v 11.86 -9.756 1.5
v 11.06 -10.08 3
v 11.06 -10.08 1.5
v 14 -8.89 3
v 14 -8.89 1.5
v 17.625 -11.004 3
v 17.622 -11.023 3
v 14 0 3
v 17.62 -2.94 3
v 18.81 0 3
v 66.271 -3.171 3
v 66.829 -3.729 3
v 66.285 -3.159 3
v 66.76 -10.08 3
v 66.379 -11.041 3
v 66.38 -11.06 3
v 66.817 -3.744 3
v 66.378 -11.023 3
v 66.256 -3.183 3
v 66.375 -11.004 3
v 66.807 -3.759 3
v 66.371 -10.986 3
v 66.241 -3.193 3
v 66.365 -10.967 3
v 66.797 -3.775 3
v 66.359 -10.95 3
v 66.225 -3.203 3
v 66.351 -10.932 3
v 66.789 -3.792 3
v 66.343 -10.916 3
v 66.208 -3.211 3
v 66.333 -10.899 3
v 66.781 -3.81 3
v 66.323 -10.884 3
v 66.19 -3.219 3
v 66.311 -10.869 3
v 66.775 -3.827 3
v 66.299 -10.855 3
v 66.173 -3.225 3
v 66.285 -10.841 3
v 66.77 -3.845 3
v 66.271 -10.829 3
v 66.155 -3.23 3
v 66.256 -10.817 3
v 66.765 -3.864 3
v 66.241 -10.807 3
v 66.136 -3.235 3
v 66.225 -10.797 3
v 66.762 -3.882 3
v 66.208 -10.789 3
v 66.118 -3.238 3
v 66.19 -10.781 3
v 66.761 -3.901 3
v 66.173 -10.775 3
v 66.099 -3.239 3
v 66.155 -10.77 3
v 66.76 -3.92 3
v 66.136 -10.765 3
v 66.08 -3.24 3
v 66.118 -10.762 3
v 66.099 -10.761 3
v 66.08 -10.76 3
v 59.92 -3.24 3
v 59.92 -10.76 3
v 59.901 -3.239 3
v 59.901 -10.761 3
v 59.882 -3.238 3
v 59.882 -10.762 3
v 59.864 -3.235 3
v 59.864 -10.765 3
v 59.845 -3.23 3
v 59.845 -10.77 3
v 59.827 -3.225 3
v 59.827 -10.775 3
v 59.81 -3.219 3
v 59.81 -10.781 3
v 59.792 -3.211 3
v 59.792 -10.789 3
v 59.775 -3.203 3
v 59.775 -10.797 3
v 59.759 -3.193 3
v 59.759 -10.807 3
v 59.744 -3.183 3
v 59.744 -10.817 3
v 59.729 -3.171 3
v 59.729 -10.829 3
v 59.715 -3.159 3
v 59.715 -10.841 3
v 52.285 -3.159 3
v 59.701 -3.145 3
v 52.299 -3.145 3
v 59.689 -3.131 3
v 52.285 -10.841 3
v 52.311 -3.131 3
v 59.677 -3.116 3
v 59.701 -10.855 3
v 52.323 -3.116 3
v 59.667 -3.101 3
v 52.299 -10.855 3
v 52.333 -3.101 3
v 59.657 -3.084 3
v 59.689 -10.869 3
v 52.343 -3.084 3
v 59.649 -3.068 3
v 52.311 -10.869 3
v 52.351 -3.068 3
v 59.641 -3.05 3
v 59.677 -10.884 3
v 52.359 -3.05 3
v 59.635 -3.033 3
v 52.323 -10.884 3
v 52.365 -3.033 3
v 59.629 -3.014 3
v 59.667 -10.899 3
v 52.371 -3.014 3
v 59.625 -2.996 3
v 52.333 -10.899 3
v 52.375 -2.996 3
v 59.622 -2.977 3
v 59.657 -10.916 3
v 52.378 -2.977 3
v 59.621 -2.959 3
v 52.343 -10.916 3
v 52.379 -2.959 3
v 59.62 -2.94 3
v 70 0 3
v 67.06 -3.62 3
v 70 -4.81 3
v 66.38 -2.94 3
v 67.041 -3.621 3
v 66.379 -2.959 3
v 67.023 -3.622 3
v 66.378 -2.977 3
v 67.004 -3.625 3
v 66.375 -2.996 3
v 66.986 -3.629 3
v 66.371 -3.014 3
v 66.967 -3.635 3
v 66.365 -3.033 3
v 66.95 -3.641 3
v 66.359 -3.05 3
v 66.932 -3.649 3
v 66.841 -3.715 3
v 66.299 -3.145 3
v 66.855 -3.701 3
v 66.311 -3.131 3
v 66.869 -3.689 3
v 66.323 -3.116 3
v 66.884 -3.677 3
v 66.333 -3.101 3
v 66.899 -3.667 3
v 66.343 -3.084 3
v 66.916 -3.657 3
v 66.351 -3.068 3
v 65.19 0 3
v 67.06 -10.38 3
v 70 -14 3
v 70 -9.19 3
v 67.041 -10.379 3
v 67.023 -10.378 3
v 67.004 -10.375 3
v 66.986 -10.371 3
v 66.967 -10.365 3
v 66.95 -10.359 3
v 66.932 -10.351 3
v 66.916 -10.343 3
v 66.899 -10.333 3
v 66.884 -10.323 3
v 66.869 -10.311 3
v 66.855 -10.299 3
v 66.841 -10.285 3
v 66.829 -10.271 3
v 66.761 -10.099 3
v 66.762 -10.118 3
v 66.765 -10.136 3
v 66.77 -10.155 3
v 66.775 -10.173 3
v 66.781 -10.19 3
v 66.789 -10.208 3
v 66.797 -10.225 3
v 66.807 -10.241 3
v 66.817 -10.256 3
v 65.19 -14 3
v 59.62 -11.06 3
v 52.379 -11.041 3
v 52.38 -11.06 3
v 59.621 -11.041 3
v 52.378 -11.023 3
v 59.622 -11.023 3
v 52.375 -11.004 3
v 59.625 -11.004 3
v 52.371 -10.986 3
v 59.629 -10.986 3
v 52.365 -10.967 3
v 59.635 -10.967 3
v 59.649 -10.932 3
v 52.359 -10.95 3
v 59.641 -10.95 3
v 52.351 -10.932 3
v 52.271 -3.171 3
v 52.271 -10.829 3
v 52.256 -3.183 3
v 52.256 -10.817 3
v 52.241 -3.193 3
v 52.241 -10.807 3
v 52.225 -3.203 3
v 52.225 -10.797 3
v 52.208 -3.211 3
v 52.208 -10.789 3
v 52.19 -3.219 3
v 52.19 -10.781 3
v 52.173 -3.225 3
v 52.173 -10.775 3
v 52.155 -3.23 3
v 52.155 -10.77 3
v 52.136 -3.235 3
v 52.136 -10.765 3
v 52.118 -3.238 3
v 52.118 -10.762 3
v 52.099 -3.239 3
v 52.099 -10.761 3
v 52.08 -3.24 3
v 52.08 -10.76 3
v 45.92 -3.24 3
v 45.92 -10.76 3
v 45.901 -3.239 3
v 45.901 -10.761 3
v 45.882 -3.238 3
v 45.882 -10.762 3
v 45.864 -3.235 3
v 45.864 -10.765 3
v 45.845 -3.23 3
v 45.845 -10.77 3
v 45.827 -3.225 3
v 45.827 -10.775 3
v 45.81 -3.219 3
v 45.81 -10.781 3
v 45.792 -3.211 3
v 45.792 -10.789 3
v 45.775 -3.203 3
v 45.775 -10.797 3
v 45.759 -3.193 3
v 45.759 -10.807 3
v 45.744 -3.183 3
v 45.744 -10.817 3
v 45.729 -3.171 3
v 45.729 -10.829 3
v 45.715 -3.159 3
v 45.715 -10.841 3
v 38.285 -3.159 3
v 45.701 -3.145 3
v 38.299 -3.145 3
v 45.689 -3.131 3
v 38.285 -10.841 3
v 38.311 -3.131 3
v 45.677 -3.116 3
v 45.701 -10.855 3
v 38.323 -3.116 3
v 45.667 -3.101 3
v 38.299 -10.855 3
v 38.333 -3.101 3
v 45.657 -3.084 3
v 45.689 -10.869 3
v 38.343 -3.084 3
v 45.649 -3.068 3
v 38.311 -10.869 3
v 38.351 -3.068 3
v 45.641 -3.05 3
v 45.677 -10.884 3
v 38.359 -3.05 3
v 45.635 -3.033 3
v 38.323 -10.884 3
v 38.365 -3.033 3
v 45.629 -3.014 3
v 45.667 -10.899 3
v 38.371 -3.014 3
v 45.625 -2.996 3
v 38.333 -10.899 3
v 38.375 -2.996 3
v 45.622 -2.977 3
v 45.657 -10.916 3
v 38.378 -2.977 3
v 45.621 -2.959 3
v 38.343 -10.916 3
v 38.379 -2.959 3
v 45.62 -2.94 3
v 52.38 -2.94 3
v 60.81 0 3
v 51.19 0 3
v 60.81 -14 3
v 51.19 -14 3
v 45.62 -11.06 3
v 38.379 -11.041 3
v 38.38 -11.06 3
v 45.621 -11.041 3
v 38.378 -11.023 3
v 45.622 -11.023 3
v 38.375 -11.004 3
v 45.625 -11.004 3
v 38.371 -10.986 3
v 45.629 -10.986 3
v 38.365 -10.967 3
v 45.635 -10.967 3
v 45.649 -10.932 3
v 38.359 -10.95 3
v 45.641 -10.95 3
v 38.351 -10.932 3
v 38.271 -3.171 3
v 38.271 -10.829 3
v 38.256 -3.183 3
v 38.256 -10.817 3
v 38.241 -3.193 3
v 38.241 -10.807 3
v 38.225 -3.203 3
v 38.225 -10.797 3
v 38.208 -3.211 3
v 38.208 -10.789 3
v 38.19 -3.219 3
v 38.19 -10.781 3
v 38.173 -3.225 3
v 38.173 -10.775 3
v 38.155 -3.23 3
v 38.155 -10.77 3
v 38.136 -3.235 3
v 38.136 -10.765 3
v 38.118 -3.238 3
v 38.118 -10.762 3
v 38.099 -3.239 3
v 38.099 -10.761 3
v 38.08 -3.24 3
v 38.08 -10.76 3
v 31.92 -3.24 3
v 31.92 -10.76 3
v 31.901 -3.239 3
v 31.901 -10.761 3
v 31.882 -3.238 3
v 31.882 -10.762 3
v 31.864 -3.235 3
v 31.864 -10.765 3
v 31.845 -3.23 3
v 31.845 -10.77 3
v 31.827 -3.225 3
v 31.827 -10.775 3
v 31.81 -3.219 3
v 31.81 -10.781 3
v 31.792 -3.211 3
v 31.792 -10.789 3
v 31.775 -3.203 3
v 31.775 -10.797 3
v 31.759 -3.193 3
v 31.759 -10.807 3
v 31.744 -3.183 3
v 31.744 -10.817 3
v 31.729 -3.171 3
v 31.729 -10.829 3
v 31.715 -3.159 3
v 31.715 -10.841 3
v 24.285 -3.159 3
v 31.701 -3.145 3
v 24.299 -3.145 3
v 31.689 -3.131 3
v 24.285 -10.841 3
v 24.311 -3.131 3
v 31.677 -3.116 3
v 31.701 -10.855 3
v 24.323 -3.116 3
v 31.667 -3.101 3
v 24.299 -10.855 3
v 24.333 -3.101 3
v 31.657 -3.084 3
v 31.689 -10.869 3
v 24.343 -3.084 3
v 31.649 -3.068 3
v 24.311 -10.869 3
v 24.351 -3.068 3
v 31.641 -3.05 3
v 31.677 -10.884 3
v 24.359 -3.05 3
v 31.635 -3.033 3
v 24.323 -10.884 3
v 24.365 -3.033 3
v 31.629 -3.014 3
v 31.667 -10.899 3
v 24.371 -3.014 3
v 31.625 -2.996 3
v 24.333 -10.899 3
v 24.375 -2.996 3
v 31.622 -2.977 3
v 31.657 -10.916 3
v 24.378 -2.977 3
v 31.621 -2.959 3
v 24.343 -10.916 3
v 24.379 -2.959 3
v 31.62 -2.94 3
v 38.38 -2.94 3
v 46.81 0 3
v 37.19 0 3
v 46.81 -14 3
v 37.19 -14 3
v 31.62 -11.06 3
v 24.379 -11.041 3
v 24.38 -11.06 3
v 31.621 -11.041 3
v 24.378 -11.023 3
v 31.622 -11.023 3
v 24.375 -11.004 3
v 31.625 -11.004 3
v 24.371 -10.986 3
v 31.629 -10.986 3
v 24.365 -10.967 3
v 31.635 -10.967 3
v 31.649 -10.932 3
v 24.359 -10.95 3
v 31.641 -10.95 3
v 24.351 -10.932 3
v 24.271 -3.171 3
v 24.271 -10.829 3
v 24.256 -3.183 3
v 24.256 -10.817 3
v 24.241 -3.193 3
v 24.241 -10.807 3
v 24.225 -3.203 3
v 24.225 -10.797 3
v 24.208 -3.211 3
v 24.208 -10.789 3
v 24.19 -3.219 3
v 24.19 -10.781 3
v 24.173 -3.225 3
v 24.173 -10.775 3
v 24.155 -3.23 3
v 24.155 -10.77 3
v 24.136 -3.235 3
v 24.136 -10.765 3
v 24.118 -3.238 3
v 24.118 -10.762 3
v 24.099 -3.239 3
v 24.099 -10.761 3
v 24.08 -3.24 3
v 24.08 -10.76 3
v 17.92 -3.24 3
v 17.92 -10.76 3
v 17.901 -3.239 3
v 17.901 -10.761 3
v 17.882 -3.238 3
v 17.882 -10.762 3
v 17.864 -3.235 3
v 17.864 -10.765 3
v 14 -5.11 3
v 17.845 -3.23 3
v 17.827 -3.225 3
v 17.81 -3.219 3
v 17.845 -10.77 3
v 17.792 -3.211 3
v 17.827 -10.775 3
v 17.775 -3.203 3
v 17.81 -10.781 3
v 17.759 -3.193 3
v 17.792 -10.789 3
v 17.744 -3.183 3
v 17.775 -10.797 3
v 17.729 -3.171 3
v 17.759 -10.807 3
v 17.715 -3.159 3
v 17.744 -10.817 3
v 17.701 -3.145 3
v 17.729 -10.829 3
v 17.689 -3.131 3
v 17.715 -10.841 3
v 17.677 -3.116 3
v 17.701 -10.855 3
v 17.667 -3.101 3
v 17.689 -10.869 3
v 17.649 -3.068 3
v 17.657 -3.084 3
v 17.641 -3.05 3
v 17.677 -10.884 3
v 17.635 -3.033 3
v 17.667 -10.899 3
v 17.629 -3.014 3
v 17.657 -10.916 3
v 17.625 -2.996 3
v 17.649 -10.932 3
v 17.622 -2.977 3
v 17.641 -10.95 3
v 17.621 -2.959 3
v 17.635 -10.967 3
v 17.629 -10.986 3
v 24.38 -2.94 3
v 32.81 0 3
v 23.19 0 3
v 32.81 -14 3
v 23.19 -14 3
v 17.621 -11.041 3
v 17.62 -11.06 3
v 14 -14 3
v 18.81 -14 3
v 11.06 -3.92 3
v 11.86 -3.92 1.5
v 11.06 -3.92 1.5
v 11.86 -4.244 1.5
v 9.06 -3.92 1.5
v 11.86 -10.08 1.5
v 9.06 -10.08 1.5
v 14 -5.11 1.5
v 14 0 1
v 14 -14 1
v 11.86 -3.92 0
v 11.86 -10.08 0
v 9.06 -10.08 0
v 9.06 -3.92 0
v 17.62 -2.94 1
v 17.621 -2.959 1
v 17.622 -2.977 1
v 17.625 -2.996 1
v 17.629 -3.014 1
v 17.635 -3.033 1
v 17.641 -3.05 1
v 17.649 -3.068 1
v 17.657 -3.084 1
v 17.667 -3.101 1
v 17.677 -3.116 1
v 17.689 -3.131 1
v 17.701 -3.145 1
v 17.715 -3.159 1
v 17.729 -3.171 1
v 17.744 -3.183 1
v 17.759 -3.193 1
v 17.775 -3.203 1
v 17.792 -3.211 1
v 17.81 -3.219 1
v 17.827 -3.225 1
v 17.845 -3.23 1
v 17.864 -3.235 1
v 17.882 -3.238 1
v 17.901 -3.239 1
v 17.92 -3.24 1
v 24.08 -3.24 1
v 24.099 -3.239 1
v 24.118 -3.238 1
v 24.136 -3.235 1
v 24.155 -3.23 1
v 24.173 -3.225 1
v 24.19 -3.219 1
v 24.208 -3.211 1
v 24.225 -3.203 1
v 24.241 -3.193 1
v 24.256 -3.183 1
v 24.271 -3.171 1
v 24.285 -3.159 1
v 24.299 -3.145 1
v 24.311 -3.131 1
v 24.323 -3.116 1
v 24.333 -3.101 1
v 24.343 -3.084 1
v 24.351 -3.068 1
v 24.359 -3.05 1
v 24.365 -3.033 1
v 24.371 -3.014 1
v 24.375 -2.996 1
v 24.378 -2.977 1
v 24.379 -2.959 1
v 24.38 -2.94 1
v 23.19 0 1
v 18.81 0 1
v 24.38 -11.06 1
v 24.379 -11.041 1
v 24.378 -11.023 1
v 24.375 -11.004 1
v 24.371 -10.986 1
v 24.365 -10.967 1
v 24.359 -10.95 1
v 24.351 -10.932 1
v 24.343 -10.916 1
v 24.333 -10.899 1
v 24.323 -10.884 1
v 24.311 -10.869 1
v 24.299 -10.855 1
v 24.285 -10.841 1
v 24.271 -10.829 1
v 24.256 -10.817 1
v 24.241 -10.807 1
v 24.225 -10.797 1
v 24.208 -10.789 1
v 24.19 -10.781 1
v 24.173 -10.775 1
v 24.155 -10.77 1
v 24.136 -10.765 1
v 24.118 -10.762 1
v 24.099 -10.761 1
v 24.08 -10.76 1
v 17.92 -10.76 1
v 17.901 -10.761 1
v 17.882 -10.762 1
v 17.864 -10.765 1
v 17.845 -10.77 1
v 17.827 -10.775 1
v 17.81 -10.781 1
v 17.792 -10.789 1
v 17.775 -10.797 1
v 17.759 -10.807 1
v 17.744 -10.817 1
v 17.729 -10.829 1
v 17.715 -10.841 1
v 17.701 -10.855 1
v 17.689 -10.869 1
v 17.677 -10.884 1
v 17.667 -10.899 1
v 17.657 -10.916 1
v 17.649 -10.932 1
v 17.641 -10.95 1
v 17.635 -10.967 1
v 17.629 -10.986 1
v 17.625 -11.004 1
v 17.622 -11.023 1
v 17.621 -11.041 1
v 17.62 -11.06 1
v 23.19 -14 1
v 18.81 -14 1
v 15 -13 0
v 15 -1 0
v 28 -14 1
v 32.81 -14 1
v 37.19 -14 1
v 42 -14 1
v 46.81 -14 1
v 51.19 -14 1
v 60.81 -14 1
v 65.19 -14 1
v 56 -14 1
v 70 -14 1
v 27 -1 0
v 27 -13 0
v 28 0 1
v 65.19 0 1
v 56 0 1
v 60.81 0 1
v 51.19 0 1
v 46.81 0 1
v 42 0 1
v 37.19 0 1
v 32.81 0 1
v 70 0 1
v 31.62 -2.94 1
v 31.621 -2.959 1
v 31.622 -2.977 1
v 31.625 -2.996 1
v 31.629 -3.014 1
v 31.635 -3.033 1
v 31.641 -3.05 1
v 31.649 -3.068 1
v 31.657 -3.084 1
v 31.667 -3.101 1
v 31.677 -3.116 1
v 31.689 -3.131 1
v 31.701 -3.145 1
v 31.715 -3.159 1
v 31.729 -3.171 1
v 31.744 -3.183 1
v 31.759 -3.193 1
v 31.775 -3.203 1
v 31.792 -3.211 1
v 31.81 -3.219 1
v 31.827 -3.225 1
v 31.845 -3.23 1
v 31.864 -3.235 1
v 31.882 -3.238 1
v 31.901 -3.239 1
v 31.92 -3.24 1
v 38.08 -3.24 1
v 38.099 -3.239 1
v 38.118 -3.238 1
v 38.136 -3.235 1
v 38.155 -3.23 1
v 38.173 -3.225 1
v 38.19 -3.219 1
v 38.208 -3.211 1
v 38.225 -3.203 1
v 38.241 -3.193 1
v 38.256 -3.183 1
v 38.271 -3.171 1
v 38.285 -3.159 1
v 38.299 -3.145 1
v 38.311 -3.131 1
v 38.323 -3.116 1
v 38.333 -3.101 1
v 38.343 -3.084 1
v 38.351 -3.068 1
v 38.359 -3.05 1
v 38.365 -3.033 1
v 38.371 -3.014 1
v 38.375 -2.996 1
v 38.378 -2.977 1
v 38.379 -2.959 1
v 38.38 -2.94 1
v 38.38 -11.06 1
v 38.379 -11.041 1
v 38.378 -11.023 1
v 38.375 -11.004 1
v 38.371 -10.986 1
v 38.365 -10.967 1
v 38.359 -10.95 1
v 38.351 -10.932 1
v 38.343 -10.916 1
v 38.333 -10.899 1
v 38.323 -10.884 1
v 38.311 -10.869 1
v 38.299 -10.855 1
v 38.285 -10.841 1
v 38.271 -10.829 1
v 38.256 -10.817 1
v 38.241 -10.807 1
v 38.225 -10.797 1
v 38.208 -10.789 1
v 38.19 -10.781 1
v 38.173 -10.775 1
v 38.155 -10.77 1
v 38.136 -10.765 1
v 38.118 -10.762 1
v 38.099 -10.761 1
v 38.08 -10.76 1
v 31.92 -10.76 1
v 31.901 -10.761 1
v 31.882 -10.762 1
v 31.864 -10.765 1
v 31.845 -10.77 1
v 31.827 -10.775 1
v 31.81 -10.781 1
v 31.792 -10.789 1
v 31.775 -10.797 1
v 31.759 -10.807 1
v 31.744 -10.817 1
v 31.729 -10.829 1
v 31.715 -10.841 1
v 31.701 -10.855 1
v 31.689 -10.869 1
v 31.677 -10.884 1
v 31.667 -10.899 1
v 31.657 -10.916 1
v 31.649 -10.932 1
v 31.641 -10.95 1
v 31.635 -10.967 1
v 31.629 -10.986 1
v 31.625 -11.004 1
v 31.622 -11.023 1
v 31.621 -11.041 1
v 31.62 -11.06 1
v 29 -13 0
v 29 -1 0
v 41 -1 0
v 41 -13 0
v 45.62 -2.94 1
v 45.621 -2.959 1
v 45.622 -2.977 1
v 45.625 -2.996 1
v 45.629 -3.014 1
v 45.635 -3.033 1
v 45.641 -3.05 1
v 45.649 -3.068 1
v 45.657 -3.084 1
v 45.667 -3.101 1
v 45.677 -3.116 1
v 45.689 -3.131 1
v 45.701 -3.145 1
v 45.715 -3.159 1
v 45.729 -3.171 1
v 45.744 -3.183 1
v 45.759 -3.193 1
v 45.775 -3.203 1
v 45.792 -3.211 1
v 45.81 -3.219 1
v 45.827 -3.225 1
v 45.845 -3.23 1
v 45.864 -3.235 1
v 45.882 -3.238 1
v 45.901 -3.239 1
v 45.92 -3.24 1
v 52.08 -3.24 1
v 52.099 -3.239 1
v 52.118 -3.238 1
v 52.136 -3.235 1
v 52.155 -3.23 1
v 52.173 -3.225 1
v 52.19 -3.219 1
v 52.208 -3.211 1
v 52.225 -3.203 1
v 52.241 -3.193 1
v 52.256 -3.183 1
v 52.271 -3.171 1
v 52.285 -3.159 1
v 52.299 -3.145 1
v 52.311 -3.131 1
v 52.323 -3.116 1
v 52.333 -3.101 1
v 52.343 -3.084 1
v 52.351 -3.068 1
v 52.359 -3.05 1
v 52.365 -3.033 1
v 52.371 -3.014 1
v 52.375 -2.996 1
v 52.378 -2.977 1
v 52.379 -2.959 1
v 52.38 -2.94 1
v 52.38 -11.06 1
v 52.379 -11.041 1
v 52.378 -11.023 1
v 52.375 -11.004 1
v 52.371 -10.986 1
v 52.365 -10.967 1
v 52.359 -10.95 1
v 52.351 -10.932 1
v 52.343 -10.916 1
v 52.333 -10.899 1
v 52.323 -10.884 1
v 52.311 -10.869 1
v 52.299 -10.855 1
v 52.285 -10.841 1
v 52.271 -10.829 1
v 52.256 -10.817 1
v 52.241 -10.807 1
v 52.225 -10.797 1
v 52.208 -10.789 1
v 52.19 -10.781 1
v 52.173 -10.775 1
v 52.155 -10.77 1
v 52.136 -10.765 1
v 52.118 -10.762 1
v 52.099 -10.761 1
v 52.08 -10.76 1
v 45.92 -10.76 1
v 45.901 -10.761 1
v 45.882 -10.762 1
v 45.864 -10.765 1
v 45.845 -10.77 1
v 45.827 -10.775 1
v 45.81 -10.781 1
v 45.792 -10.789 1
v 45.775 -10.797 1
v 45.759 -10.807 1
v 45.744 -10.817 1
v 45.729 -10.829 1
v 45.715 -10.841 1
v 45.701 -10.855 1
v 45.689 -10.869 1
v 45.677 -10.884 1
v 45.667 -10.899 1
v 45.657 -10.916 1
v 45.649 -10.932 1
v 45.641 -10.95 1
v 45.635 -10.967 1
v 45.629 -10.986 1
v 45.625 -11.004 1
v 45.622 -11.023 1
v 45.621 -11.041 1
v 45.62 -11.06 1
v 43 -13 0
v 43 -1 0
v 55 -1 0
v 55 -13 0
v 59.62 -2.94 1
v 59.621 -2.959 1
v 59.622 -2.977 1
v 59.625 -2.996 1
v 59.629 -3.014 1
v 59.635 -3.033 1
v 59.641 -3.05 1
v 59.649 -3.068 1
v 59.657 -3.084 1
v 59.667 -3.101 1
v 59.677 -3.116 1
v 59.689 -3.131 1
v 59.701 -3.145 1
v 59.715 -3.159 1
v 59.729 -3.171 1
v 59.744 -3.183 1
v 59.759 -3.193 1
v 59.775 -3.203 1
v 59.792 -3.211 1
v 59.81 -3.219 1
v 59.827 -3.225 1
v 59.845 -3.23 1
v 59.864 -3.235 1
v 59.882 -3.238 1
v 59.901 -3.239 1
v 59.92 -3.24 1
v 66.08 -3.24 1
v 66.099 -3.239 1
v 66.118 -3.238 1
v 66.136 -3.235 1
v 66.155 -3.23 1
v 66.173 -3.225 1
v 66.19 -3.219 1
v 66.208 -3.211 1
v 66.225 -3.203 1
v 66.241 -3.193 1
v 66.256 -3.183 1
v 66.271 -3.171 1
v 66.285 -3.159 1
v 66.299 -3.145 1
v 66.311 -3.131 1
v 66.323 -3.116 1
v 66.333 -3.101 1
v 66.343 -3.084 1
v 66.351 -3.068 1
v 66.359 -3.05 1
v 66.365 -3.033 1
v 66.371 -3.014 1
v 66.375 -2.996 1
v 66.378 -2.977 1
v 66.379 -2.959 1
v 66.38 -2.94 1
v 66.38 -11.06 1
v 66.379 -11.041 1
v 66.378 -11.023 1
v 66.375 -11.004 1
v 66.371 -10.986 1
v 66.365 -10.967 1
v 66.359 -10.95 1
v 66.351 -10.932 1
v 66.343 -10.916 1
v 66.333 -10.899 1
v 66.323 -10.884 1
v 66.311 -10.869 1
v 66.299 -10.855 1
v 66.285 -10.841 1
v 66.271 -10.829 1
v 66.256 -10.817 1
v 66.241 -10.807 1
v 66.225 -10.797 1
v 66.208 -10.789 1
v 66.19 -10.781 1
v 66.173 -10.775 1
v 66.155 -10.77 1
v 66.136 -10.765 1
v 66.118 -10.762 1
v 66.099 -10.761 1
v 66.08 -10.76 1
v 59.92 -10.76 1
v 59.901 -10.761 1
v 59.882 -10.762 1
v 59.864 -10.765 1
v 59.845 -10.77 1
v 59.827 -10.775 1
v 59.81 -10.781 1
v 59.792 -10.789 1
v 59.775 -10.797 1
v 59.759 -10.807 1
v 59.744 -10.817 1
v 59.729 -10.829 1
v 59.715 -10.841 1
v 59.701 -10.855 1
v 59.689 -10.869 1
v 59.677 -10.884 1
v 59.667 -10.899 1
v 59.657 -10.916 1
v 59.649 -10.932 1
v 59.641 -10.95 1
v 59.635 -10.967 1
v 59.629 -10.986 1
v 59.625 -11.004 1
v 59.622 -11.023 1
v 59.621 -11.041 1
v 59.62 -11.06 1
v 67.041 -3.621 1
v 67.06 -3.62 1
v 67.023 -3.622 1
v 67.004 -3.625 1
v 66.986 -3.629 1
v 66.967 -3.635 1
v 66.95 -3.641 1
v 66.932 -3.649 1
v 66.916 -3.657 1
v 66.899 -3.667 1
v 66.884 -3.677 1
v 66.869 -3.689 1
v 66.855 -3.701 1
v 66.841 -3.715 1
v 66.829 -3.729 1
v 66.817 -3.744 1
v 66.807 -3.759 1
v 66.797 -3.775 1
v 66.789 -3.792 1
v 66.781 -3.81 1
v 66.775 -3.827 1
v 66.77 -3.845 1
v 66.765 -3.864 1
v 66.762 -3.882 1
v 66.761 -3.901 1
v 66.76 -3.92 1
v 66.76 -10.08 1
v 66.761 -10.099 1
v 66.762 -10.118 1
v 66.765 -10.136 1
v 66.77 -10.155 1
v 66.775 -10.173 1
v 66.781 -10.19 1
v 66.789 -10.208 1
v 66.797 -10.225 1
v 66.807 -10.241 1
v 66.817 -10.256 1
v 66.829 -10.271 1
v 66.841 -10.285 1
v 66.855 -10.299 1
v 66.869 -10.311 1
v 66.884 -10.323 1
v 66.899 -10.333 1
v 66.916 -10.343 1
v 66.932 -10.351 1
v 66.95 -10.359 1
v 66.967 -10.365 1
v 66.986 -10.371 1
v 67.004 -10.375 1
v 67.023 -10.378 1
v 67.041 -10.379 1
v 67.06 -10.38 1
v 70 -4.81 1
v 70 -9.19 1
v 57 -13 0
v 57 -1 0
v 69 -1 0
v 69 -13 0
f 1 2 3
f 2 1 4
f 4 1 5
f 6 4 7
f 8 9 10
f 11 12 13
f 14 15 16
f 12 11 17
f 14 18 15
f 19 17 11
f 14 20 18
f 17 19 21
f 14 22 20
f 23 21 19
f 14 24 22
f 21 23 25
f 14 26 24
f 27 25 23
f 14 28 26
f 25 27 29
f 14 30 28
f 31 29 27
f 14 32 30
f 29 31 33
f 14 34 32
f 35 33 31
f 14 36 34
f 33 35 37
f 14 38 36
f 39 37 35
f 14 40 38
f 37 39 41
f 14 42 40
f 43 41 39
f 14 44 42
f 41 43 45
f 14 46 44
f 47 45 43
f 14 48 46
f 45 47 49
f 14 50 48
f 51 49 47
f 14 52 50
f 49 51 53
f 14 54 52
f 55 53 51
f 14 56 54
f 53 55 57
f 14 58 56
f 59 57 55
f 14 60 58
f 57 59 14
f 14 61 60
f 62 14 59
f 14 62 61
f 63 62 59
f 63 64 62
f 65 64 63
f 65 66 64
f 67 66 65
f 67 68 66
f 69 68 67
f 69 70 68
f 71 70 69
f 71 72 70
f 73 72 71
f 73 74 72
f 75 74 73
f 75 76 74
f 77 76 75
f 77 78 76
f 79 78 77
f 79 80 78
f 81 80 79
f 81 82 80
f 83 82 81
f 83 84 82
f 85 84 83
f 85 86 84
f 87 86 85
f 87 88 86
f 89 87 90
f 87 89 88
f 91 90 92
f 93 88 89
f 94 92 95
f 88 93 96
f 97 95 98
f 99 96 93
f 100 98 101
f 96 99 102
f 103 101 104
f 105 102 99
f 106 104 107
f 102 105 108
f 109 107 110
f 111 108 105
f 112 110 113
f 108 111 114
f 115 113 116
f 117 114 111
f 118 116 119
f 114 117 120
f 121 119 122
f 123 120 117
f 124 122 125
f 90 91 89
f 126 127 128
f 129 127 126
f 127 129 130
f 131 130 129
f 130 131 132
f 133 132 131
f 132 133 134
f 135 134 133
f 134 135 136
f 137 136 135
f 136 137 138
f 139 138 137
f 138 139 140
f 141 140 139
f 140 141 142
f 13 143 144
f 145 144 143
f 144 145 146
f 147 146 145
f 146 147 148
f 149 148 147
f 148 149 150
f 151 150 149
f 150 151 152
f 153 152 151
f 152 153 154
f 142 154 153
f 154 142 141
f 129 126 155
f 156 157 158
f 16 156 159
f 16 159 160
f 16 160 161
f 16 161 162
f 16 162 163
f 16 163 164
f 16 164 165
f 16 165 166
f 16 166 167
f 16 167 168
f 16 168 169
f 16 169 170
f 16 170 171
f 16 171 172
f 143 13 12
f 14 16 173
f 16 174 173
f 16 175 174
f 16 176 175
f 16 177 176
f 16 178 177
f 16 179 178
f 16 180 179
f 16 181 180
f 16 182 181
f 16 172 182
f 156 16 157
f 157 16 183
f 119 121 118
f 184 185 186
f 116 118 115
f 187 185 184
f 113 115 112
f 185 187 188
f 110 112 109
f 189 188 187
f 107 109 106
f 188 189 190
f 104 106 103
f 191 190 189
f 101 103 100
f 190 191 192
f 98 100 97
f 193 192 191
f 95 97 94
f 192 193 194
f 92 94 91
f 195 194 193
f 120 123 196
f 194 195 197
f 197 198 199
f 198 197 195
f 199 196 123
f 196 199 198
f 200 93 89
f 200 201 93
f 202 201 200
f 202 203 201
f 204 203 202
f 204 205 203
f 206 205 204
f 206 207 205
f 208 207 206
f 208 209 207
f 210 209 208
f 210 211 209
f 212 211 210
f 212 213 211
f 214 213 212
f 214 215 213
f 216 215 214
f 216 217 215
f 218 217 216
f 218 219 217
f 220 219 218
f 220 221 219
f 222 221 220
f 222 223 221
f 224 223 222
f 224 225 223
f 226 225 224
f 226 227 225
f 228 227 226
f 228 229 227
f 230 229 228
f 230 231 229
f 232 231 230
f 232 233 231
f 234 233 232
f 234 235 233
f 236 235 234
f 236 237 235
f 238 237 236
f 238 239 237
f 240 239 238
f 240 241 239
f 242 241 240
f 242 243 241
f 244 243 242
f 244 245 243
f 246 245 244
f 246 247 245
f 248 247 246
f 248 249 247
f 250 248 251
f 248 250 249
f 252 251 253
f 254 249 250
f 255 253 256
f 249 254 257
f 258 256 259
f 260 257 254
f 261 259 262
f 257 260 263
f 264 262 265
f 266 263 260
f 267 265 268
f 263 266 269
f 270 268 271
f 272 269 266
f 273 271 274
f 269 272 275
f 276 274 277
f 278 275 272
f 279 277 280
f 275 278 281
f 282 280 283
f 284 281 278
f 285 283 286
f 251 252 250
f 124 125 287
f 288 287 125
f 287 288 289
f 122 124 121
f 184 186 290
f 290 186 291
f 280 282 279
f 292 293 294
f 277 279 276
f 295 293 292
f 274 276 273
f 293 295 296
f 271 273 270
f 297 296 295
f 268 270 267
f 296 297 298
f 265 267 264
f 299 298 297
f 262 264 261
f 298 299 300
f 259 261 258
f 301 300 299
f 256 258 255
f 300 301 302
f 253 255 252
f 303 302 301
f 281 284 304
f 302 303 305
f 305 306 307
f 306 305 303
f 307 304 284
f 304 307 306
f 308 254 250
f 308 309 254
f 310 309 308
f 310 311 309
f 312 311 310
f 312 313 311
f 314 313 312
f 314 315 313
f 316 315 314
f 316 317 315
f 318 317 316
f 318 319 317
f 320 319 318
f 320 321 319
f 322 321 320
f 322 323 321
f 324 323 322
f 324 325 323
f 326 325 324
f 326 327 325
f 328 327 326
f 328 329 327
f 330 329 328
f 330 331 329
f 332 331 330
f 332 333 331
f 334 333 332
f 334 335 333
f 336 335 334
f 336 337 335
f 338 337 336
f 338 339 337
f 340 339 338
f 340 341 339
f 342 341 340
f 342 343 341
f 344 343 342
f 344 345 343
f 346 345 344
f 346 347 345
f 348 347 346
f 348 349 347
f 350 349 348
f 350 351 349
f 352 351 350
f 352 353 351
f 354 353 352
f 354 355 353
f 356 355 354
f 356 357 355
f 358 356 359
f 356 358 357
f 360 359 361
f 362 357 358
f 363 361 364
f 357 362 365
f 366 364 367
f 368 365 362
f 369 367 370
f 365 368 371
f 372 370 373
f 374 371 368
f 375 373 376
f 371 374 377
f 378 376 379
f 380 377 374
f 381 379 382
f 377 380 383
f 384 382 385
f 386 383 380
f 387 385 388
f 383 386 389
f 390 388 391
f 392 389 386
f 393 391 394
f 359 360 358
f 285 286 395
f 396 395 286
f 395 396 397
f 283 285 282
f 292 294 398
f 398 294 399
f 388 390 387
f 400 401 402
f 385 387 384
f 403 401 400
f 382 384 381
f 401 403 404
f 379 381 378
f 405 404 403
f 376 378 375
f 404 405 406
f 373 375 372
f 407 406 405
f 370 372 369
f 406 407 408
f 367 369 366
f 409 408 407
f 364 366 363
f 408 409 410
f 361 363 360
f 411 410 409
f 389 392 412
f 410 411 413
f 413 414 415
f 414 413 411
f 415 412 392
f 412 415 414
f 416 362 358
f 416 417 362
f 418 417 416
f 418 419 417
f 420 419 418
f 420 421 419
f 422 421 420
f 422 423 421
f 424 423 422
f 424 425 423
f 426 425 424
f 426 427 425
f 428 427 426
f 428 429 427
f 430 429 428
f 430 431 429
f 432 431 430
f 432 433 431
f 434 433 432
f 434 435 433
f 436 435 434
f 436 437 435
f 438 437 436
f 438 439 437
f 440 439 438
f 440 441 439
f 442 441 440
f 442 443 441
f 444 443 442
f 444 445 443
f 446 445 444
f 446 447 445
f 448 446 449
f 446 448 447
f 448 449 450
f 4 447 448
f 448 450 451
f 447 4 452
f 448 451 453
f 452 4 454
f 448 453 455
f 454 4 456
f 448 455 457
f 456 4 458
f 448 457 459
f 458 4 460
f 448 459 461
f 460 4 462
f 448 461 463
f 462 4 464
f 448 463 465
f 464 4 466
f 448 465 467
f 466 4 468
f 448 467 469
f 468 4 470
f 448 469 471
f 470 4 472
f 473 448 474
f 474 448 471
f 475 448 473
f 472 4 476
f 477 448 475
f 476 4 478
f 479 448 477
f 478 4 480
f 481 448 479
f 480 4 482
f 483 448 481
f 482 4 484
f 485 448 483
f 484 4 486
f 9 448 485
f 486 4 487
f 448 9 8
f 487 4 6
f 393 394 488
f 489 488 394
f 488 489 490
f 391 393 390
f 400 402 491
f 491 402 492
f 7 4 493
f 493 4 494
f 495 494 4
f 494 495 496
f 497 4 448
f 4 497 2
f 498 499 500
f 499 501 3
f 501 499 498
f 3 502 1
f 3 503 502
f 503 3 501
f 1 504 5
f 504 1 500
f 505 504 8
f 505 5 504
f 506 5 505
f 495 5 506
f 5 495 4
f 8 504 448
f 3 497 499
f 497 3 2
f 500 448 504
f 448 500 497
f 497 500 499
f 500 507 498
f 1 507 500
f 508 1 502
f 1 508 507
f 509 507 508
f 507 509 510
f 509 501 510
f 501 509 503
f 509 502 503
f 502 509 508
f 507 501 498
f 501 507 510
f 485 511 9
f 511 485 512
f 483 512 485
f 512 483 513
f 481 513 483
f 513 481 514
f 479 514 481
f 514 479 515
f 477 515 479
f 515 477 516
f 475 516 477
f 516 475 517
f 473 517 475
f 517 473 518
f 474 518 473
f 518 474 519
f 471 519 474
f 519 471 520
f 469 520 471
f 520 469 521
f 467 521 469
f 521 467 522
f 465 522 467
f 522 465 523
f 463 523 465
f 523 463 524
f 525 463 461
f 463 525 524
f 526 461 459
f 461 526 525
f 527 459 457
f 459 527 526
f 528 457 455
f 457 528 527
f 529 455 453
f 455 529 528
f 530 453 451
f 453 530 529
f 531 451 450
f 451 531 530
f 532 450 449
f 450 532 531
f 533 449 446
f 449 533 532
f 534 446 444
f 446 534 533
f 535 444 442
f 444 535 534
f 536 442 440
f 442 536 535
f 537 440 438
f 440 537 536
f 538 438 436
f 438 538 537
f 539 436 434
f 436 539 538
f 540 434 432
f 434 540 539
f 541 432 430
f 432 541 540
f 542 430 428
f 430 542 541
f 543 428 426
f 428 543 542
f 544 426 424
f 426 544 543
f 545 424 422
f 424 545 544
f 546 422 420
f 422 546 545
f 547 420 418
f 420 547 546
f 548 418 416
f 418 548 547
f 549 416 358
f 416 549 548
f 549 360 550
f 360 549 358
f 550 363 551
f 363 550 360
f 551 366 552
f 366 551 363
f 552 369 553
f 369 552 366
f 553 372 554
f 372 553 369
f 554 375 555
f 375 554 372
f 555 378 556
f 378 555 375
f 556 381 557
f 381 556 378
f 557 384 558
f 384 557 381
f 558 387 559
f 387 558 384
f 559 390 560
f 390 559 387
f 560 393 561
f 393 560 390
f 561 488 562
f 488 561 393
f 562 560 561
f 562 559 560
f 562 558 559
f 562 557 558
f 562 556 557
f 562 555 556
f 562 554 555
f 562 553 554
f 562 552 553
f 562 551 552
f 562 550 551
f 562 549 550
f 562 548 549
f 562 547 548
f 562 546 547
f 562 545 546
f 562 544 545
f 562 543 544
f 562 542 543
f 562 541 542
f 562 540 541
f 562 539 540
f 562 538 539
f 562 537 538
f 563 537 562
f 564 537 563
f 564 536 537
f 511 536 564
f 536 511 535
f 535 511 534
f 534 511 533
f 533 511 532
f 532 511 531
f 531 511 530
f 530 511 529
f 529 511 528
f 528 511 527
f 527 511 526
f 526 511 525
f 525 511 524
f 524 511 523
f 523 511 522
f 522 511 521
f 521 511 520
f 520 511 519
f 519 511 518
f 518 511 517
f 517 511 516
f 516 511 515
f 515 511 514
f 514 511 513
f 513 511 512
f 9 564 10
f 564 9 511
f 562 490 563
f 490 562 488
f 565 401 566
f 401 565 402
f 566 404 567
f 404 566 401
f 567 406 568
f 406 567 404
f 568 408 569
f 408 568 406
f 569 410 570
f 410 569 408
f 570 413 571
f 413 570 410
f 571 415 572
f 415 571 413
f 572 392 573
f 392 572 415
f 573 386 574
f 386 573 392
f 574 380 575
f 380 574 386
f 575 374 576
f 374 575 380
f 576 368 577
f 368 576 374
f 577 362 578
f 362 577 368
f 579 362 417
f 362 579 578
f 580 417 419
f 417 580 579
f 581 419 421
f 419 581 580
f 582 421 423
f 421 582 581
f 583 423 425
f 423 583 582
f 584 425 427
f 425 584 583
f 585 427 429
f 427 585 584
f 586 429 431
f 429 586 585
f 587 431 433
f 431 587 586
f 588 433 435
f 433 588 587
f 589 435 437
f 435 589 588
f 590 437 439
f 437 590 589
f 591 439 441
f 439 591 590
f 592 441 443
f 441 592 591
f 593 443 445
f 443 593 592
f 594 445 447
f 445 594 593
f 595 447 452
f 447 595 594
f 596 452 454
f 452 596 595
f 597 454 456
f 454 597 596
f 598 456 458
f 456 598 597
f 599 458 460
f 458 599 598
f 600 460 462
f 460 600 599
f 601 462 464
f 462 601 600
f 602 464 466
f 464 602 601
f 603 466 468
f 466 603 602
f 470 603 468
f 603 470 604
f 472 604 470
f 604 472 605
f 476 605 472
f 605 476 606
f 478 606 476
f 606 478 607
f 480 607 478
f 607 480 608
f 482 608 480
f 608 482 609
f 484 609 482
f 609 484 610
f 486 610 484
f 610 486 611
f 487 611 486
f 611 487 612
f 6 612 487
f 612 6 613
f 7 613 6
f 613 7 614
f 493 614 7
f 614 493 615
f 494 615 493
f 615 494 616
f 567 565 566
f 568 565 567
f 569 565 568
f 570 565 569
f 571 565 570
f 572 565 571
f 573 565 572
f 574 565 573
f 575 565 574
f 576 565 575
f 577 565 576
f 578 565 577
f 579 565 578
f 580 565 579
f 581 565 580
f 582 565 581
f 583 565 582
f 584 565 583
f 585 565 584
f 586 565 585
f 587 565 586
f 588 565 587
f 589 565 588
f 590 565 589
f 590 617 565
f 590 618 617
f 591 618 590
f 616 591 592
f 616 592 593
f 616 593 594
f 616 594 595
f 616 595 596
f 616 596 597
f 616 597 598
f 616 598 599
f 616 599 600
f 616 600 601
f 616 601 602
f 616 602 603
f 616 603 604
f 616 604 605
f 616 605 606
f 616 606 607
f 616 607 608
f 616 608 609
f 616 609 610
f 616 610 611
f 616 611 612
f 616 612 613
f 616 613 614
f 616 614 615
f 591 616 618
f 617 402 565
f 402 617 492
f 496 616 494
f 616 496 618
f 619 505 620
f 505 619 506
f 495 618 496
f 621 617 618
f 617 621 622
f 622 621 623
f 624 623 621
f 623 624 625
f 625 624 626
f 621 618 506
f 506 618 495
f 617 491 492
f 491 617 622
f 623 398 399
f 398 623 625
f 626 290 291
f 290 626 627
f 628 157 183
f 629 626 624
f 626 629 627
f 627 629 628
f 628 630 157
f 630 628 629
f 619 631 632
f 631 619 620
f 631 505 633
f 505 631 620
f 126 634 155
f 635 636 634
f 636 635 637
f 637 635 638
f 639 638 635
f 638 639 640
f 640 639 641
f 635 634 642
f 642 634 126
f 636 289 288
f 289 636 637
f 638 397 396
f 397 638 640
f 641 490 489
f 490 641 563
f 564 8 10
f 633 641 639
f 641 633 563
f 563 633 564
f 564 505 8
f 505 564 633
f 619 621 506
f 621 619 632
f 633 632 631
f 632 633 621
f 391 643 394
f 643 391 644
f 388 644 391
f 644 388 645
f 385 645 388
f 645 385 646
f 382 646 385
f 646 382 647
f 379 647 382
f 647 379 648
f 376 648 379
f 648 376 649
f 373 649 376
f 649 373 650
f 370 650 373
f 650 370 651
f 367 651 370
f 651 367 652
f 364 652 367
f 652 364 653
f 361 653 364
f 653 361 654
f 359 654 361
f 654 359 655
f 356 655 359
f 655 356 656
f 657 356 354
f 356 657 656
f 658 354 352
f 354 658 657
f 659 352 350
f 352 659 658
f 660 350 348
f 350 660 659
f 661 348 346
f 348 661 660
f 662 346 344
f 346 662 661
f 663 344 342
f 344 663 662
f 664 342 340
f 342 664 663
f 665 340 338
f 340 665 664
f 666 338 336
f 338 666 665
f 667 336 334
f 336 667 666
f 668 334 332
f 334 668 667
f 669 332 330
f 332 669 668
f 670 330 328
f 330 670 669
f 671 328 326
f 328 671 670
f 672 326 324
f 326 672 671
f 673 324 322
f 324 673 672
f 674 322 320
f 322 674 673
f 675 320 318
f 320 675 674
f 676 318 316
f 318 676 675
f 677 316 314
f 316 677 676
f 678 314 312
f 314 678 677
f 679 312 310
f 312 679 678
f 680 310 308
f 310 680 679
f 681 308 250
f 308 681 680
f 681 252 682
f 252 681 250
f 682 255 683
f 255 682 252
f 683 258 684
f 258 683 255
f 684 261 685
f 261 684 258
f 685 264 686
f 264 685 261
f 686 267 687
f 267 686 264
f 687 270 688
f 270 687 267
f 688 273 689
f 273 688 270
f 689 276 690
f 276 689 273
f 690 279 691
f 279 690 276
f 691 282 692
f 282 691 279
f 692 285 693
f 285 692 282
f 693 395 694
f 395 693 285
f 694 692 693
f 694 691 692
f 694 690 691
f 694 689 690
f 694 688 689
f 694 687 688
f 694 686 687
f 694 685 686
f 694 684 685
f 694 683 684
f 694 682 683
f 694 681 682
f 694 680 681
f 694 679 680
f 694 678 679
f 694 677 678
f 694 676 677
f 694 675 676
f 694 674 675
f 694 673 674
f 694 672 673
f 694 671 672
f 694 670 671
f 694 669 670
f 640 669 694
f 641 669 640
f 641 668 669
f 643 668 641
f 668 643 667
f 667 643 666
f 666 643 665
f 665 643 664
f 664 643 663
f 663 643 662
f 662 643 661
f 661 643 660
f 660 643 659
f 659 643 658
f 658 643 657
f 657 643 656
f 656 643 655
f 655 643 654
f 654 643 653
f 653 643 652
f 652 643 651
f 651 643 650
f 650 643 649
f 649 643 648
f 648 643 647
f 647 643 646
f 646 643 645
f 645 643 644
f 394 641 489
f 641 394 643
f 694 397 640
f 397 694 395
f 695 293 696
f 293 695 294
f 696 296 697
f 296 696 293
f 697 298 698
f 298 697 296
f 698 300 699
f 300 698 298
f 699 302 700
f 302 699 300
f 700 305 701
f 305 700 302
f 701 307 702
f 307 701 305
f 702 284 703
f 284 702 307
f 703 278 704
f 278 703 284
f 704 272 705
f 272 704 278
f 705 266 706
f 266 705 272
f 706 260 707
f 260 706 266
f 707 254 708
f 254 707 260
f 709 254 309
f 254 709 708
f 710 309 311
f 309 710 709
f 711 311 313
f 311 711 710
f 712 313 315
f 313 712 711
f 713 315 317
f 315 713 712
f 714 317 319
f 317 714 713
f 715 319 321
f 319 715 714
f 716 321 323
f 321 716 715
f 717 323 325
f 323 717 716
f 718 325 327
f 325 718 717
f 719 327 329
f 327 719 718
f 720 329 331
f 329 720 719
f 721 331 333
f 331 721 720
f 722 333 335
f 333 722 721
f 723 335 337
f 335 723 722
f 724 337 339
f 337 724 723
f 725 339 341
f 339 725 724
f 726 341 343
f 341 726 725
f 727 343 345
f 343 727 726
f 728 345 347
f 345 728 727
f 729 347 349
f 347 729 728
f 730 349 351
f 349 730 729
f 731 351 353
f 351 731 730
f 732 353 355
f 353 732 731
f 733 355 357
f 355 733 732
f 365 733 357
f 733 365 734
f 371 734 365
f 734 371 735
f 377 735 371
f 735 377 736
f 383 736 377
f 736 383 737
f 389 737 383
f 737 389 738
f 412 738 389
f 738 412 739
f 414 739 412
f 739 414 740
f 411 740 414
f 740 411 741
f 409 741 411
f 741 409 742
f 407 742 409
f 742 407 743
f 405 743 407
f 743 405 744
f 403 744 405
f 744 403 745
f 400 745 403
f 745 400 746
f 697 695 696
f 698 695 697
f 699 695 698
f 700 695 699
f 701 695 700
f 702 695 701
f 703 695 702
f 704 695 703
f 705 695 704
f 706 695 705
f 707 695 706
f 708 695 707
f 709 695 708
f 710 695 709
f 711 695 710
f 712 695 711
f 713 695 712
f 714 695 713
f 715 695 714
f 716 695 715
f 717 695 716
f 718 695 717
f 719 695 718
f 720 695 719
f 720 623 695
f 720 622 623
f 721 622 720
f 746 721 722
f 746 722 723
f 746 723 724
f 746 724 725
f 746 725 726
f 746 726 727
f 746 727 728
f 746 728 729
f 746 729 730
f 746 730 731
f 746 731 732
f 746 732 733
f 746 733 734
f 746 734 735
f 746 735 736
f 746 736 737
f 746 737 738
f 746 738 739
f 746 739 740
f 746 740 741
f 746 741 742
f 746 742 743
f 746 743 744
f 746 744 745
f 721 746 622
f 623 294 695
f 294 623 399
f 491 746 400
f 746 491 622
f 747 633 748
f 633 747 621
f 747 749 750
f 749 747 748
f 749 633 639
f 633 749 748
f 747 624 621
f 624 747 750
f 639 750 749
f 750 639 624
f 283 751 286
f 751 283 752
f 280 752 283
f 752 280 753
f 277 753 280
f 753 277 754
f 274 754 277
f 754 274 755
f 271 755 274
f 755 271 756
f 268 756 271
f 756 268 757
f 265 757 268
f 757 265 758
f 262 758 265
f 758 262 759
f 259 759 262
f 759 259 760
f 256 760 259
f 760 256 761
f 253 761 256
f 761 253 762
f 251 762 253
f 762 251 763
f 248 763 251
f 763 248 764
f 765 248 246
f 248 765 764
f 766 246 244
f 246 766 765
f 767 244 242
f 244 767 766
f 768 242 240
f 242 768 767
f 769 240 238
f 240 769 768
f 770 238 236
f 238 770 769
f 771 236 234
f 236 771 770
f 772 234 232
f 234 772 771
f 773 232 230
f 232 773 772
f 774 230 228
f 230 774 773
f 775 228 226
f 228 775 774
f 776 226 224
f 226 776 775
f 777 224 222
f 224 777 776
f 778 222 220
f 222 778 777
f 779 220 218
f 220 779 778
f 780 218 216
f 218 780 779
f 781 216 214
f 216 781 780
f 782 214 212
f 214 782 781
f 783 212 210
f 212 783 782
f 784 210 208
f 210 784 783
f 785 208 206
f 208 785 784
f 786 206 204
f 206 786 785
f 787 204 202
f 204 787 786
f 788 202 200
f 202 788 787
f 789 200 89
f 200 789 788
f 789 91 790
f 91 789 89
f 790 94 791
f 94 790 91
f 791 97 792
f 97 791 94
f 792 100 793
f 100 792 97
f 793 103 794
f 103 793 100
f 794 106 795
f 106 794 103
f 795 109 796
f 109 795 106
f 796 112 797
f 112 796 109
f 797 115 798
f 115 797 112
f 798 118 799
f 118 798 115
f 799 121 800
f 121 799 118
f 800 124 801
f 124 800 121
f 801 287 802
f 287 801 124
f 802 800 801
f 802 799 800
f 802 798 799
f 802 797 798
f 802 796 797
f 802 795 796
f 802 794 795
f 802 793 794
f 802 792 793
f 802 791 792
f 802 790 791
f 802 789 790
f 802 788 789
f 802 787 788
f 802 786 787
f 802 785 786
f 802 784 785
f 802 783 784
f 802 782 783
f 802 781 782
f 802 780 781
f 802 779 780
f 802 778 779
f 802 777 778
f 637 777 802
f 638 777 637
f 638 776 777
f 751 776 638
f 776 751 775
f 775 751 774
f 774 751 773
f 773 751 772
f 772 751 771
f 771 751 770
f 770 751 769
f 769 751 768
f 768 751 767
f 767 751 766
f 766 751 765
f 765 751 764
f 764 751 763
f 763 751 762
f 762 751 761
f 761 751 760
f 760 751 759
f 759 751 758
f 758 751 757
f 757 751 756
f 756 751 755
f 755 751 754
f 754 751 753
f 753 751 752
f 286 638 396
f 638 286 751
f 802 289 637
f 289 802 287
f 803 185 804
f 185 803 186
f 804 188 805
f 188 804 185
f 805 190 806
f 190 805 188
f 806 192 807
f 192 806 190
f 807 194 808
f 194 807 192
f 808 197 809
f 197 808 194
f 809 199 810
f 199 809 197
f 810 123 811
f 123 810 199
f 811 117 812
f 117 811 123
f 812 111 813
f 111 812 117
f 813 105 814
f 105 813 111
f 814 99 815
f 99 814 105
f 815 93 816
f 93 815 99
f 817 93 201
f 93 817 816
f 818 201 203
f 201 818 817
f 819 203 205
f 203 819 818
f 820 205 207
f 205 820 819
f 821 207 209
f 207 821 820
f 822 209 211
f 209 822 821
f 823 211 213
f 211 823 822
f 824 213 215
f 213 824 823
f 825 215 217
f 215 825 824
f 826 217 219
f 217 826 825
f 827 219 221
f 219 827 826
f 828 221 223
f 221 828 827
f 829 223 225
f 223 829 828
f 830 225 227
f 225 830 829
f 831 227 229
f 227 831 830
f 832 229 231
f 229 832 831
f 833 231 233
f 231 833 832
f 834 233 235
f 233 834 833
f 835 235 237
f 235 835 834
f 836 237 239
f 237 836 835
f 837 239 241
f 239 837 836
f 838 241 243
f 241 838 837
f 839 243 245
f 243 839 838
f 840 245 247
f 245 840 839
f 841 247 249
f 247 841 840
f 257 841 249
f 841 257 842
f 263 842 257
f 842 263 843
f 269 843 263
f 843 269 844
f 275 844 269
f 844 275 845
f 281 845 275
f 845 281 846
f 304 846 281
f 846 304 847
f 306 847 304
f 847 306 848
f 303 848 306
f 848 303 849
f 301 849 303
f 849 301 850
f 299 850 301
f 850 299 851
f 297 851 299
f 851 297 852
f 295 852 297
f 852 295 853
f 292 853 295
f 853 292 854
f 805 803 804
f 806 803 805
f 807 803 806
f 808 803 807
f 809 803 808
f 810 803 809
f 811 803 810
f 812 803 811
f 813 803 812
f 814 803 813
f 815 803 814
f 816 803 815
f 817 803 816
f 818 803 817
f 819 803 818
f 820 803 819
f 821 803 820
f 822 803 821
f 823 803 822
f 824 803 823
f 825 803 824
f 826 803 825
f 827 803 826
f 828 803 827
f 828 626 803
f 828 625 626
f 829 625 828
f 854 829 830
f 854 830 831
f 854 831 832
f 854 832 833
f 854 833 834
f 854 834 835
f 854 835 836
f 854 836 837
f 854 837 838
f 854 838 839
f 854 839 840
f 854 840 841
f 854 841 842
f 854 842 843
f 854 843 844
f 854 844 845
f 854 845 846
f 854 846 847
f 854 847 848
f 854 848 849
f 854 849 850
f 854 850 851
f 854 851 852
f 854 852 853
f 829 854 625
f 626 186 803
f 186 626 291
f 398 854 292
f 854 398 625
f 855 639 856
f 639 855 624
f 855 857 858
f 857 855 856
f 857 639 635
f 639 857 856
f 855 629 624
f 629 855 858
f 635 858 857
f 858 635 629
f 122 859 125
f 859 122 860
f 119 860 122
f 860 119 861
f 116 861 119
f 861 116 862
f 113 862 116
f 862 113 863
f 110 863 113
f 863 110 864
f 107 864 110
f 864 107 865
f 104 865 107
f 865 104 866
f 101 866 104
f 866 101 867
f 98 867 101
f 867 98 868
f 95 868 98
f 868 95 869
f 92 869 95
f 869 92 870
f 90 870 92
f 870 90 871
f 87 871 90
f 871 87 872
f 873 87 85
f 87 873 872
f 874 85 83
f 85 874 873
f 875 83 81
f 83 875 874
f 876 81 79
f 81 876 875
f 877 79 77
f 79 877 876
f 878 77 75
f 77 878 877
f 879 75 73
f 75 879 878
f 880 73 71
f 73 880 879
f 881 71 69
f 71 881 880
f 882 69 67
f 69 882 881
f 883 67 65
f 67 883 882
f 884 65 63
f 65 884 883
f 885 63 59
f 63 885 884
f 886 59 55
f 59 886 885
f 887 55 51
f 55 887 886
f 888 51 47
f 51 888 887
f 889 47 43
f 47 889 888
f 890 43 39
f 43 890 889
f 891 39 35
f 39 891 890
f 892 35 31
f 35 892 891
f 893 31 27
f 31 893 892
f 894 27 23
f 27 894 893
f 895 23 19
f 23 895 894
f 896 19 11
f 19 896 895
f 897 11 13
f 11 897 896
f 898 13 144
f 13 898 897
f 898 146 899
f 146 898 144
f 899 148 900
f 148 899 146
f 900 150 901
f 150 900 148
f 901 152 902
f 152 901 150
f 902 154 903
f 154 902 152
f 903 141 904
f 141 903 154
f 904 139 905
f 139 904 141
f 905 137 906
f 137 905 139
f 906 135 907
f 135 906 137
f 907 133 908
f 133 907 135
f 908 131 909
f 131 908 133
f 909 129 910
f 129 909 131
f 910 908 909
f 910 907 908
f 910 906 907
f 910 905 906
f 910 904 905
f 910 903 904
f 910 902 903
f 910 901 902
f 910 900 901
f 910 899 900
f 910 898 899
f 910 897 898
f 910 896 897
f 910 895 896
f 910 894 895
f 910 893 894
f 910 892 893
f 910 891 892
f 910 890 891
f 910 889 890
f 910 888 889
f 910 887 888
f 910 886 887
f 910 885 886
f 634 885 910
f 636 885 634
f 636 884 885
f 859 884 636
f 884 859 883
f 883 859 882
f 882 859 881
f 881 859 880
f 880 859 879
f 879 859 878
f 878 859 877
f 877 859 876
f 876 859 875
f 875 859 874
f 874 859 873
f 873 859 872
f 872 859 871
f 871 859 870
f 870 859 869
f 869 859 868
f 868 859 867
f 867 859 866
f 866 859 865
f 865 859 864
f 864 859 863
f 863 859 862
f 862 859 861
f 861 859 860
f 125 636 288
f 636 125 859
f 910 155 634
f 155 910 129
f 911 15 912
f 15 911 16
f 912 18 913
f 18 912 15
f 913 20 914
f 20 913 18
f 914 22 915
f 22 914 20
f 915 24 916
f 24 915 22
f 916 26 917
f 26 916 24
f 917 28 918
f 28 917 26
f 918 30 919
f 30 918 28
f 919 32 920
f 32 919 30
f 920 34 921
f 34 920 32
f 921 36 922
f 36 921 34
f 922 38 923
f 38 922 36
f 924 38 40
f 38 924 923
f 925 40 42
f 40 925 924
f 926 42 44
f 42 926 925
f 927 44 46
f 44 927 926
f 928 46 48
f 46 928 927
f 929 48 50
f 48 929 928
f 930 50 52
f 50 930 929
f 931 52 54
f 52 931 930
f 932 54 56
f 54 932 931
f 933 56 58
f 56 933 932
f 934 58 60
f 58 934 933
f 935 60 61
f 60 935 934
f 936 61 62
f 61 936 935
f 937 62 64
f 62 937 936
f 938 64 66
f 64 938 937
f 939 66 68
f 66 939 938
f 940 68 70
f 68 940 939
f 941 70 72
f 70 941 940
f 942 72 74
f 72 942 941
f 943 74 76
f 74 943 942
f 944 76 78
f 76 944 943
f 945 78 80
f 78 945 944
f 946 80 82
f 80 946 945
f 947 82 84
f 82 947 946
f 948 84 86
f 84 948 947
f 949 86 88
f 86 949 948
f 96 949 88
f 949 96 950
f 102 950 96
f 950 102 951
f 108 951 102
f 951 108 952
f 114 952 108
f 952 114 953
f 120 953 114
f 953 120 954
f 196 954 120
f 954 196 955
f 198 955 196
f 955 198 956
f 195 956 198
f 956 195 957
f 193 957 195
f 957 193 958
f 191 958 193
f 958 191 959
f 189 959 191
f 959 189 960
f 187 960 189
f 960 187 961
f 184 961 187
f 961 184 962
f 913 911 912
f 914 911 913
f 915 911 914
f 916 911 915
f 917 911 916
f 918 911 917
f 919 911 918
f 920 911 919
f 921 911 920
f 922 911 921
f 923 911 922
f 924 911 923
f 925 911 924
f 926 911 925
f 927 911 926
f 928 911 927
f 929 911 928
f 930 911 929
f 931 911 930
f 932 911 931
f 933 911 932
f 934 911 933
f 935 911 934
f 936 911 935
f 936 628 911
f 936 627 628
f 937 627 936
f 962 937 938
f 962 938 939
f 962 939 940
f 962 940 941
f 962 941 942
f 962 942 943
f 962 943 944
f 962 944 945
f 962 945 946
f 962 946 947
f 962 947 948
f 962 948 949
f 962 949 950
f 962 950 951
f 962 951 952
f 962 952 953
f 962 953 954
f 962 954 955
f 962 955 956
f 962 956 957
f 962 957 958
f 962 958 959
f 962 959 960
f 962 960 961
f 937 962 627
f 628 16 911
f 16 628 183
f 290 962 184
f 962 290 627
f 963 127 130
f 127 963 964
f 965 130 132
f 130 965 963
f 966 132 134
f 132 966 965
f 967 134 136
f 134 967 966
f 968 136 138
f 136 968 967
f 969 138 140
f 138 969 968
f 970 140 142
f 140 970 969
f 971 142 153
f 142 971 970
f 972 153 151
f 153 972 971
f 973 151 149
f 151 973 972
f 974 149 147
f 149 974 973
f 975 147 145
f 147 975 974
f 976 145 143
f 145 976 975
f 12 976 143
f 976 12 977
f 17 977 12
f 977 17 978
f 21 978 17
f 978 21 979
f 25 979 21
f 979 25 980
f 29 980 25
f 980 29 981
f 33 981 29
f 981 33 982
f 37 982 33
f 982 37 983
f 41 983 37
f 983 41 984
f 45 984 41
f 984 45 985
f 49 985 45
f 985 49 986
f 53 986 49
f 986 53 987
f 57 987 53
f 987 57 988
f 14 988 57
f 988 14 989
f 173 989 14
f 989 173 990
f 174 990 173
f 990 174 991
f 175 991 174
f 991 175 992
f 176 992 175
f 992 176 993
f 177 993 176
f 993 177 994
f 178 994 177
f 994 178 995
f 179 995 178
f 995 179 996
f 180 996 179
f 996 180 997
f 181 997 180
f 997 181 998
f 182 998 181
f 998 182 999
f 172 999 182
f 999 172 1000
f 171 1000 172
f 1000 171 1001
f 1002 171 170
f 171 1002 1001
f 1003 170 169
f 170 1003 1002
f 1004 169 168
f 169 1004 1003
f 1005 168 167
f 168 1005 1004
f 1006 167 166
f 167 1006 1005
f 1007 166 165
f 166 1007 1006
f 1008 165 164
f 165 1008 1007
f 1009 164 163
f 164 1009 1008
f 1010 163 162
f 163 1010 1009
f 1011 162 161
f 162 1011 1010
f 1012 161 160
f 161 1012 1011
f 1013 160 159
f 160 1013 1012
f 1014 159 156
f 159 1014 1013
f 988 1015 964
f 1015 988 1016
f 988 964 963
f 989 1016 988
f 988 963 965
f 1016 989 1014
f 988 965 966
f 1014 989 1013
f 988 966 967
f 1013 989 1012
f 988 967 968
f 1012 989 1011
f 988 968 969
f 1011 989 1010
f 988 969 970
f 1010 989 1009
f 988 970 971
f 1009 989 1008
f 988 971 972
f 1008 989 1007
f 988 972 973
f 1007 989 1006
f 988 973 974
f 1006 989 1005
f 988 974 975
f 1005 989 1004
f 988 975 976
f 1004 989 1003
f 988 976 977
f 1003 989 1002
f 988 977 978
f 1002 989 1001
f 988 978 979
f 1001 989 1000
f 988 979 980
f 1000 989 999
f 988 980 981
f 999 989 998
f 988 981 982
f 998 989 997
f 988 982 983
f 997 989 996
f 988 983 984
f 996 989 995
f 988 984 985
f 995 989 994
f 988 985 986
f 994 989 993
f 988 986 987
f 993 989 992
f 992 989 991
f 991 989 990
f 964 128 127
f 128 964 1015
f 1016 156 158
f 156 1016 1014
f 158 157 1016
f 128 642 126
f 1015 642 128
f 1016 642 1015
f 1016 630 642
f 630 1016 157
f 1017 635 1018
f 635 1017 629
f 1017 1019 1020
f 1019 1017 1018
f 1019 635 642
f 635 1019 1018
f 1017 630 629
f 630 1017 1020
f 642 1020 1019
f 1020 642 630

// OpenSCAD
wallWidth = 14;
wallHeight = 3;
reinforcedWallHeight = 3;

jointHeight = 2;
jointHeightTolerance = 0.5;
jointMinWidth = 0.27;
jointMaxWidth = 0.44;
jointLength = 0.21;

tolerance = 0.3;

config = "mffft";

$fn = 100;

module jointTemplate(expansion = 0, jointHeightOffset = 0)
{
	minkowski()
	{
		linear_extrude(height = jointHeight - jointHeightOffset){
			polygon(points=[[0, wallWidth*jointMinWidth/2], 
							[-jointLength*wallWidth, wallWidth*jointMaxWidth/2], 
							[-jointLength*wallWidth, -wallWidth*jointMaxWidth/2], 
							[0, -wallWidth*jointMinWidth/2]], 
					paths=[[0,1,2,3]]);
		}
		difference()
		{
			cylinder(r=expansion, h = 0.0000000001);
			translate([0, -50, -20])
			cube([100,100,100]);
		}
	}
}

module mJoint()
{
	translate([wallWidth, wallWidth/2, 0])
	jointTemplate(0, jointHeightTolerance); 

	translate([wallWidth-jointLength*wallWidth-2, wallWidth/2 - jointMaxWidth*wallWidth/2, jointHeight-jointHeightTolerance])
	cube([2.8, jointMaxWidth*wallWidth, reinforcedWallHeight - (jointHeight-jointHeightTolerance)]);
}

module emptyWall()
{
	hull()
	{
//reinforcedWallHeight
		cube([wallWidth, wallWidth, jointHeight]);
		diff = reinforcedWallHeight-jointHeight;

		translate([diff,diff,jointHeight])
		cube([wallWidth-2*diff, wallWidth-2*diff, diff]);
	}
}

module fJoint(terminal = false)
{
	difference()
	{
		hull()
		{
//reinforcedWallHeight
			cube([wallWidth, wallWidth, jointHeight]);
			diff = reinforcedWallHeight-jointHeight;

			translate([diff,diff,jointHeight])
			cube([wallWidth-2*diff, wallWidth-2*diff, diff]);
		}

		translate([wallWidth/2, -0.0001, -0.0001])
		rotate([0, 0, -90])
		jointTemplate(tolerance);

		translate([wallWidth/2, wallWidth+0.0001, -0.0001])
		rotate([0, 0, 90])
		jointTemplate(tolerance);

		if(terminal)
		{
			translate([wallWidth+0.0001, wallWidth/2, -0.0001])
			jointTemplate(tolerance);
		}
	}
}

translate([0,0,reinforcedWallHeight])
rotate([180, 0, 0])
for(i=[0:len(config)])
{
	echo(config[i]);
	translate([wallWidth*i, 0, 0])
			if(config[i]=="m") mJoint();
	else 	if(config[i]=="e") emptyWall();
	else 	if(config[i]=="f") fJoint();
	else 	if(config[i]=="t") fJoint(terminal=true);
}
